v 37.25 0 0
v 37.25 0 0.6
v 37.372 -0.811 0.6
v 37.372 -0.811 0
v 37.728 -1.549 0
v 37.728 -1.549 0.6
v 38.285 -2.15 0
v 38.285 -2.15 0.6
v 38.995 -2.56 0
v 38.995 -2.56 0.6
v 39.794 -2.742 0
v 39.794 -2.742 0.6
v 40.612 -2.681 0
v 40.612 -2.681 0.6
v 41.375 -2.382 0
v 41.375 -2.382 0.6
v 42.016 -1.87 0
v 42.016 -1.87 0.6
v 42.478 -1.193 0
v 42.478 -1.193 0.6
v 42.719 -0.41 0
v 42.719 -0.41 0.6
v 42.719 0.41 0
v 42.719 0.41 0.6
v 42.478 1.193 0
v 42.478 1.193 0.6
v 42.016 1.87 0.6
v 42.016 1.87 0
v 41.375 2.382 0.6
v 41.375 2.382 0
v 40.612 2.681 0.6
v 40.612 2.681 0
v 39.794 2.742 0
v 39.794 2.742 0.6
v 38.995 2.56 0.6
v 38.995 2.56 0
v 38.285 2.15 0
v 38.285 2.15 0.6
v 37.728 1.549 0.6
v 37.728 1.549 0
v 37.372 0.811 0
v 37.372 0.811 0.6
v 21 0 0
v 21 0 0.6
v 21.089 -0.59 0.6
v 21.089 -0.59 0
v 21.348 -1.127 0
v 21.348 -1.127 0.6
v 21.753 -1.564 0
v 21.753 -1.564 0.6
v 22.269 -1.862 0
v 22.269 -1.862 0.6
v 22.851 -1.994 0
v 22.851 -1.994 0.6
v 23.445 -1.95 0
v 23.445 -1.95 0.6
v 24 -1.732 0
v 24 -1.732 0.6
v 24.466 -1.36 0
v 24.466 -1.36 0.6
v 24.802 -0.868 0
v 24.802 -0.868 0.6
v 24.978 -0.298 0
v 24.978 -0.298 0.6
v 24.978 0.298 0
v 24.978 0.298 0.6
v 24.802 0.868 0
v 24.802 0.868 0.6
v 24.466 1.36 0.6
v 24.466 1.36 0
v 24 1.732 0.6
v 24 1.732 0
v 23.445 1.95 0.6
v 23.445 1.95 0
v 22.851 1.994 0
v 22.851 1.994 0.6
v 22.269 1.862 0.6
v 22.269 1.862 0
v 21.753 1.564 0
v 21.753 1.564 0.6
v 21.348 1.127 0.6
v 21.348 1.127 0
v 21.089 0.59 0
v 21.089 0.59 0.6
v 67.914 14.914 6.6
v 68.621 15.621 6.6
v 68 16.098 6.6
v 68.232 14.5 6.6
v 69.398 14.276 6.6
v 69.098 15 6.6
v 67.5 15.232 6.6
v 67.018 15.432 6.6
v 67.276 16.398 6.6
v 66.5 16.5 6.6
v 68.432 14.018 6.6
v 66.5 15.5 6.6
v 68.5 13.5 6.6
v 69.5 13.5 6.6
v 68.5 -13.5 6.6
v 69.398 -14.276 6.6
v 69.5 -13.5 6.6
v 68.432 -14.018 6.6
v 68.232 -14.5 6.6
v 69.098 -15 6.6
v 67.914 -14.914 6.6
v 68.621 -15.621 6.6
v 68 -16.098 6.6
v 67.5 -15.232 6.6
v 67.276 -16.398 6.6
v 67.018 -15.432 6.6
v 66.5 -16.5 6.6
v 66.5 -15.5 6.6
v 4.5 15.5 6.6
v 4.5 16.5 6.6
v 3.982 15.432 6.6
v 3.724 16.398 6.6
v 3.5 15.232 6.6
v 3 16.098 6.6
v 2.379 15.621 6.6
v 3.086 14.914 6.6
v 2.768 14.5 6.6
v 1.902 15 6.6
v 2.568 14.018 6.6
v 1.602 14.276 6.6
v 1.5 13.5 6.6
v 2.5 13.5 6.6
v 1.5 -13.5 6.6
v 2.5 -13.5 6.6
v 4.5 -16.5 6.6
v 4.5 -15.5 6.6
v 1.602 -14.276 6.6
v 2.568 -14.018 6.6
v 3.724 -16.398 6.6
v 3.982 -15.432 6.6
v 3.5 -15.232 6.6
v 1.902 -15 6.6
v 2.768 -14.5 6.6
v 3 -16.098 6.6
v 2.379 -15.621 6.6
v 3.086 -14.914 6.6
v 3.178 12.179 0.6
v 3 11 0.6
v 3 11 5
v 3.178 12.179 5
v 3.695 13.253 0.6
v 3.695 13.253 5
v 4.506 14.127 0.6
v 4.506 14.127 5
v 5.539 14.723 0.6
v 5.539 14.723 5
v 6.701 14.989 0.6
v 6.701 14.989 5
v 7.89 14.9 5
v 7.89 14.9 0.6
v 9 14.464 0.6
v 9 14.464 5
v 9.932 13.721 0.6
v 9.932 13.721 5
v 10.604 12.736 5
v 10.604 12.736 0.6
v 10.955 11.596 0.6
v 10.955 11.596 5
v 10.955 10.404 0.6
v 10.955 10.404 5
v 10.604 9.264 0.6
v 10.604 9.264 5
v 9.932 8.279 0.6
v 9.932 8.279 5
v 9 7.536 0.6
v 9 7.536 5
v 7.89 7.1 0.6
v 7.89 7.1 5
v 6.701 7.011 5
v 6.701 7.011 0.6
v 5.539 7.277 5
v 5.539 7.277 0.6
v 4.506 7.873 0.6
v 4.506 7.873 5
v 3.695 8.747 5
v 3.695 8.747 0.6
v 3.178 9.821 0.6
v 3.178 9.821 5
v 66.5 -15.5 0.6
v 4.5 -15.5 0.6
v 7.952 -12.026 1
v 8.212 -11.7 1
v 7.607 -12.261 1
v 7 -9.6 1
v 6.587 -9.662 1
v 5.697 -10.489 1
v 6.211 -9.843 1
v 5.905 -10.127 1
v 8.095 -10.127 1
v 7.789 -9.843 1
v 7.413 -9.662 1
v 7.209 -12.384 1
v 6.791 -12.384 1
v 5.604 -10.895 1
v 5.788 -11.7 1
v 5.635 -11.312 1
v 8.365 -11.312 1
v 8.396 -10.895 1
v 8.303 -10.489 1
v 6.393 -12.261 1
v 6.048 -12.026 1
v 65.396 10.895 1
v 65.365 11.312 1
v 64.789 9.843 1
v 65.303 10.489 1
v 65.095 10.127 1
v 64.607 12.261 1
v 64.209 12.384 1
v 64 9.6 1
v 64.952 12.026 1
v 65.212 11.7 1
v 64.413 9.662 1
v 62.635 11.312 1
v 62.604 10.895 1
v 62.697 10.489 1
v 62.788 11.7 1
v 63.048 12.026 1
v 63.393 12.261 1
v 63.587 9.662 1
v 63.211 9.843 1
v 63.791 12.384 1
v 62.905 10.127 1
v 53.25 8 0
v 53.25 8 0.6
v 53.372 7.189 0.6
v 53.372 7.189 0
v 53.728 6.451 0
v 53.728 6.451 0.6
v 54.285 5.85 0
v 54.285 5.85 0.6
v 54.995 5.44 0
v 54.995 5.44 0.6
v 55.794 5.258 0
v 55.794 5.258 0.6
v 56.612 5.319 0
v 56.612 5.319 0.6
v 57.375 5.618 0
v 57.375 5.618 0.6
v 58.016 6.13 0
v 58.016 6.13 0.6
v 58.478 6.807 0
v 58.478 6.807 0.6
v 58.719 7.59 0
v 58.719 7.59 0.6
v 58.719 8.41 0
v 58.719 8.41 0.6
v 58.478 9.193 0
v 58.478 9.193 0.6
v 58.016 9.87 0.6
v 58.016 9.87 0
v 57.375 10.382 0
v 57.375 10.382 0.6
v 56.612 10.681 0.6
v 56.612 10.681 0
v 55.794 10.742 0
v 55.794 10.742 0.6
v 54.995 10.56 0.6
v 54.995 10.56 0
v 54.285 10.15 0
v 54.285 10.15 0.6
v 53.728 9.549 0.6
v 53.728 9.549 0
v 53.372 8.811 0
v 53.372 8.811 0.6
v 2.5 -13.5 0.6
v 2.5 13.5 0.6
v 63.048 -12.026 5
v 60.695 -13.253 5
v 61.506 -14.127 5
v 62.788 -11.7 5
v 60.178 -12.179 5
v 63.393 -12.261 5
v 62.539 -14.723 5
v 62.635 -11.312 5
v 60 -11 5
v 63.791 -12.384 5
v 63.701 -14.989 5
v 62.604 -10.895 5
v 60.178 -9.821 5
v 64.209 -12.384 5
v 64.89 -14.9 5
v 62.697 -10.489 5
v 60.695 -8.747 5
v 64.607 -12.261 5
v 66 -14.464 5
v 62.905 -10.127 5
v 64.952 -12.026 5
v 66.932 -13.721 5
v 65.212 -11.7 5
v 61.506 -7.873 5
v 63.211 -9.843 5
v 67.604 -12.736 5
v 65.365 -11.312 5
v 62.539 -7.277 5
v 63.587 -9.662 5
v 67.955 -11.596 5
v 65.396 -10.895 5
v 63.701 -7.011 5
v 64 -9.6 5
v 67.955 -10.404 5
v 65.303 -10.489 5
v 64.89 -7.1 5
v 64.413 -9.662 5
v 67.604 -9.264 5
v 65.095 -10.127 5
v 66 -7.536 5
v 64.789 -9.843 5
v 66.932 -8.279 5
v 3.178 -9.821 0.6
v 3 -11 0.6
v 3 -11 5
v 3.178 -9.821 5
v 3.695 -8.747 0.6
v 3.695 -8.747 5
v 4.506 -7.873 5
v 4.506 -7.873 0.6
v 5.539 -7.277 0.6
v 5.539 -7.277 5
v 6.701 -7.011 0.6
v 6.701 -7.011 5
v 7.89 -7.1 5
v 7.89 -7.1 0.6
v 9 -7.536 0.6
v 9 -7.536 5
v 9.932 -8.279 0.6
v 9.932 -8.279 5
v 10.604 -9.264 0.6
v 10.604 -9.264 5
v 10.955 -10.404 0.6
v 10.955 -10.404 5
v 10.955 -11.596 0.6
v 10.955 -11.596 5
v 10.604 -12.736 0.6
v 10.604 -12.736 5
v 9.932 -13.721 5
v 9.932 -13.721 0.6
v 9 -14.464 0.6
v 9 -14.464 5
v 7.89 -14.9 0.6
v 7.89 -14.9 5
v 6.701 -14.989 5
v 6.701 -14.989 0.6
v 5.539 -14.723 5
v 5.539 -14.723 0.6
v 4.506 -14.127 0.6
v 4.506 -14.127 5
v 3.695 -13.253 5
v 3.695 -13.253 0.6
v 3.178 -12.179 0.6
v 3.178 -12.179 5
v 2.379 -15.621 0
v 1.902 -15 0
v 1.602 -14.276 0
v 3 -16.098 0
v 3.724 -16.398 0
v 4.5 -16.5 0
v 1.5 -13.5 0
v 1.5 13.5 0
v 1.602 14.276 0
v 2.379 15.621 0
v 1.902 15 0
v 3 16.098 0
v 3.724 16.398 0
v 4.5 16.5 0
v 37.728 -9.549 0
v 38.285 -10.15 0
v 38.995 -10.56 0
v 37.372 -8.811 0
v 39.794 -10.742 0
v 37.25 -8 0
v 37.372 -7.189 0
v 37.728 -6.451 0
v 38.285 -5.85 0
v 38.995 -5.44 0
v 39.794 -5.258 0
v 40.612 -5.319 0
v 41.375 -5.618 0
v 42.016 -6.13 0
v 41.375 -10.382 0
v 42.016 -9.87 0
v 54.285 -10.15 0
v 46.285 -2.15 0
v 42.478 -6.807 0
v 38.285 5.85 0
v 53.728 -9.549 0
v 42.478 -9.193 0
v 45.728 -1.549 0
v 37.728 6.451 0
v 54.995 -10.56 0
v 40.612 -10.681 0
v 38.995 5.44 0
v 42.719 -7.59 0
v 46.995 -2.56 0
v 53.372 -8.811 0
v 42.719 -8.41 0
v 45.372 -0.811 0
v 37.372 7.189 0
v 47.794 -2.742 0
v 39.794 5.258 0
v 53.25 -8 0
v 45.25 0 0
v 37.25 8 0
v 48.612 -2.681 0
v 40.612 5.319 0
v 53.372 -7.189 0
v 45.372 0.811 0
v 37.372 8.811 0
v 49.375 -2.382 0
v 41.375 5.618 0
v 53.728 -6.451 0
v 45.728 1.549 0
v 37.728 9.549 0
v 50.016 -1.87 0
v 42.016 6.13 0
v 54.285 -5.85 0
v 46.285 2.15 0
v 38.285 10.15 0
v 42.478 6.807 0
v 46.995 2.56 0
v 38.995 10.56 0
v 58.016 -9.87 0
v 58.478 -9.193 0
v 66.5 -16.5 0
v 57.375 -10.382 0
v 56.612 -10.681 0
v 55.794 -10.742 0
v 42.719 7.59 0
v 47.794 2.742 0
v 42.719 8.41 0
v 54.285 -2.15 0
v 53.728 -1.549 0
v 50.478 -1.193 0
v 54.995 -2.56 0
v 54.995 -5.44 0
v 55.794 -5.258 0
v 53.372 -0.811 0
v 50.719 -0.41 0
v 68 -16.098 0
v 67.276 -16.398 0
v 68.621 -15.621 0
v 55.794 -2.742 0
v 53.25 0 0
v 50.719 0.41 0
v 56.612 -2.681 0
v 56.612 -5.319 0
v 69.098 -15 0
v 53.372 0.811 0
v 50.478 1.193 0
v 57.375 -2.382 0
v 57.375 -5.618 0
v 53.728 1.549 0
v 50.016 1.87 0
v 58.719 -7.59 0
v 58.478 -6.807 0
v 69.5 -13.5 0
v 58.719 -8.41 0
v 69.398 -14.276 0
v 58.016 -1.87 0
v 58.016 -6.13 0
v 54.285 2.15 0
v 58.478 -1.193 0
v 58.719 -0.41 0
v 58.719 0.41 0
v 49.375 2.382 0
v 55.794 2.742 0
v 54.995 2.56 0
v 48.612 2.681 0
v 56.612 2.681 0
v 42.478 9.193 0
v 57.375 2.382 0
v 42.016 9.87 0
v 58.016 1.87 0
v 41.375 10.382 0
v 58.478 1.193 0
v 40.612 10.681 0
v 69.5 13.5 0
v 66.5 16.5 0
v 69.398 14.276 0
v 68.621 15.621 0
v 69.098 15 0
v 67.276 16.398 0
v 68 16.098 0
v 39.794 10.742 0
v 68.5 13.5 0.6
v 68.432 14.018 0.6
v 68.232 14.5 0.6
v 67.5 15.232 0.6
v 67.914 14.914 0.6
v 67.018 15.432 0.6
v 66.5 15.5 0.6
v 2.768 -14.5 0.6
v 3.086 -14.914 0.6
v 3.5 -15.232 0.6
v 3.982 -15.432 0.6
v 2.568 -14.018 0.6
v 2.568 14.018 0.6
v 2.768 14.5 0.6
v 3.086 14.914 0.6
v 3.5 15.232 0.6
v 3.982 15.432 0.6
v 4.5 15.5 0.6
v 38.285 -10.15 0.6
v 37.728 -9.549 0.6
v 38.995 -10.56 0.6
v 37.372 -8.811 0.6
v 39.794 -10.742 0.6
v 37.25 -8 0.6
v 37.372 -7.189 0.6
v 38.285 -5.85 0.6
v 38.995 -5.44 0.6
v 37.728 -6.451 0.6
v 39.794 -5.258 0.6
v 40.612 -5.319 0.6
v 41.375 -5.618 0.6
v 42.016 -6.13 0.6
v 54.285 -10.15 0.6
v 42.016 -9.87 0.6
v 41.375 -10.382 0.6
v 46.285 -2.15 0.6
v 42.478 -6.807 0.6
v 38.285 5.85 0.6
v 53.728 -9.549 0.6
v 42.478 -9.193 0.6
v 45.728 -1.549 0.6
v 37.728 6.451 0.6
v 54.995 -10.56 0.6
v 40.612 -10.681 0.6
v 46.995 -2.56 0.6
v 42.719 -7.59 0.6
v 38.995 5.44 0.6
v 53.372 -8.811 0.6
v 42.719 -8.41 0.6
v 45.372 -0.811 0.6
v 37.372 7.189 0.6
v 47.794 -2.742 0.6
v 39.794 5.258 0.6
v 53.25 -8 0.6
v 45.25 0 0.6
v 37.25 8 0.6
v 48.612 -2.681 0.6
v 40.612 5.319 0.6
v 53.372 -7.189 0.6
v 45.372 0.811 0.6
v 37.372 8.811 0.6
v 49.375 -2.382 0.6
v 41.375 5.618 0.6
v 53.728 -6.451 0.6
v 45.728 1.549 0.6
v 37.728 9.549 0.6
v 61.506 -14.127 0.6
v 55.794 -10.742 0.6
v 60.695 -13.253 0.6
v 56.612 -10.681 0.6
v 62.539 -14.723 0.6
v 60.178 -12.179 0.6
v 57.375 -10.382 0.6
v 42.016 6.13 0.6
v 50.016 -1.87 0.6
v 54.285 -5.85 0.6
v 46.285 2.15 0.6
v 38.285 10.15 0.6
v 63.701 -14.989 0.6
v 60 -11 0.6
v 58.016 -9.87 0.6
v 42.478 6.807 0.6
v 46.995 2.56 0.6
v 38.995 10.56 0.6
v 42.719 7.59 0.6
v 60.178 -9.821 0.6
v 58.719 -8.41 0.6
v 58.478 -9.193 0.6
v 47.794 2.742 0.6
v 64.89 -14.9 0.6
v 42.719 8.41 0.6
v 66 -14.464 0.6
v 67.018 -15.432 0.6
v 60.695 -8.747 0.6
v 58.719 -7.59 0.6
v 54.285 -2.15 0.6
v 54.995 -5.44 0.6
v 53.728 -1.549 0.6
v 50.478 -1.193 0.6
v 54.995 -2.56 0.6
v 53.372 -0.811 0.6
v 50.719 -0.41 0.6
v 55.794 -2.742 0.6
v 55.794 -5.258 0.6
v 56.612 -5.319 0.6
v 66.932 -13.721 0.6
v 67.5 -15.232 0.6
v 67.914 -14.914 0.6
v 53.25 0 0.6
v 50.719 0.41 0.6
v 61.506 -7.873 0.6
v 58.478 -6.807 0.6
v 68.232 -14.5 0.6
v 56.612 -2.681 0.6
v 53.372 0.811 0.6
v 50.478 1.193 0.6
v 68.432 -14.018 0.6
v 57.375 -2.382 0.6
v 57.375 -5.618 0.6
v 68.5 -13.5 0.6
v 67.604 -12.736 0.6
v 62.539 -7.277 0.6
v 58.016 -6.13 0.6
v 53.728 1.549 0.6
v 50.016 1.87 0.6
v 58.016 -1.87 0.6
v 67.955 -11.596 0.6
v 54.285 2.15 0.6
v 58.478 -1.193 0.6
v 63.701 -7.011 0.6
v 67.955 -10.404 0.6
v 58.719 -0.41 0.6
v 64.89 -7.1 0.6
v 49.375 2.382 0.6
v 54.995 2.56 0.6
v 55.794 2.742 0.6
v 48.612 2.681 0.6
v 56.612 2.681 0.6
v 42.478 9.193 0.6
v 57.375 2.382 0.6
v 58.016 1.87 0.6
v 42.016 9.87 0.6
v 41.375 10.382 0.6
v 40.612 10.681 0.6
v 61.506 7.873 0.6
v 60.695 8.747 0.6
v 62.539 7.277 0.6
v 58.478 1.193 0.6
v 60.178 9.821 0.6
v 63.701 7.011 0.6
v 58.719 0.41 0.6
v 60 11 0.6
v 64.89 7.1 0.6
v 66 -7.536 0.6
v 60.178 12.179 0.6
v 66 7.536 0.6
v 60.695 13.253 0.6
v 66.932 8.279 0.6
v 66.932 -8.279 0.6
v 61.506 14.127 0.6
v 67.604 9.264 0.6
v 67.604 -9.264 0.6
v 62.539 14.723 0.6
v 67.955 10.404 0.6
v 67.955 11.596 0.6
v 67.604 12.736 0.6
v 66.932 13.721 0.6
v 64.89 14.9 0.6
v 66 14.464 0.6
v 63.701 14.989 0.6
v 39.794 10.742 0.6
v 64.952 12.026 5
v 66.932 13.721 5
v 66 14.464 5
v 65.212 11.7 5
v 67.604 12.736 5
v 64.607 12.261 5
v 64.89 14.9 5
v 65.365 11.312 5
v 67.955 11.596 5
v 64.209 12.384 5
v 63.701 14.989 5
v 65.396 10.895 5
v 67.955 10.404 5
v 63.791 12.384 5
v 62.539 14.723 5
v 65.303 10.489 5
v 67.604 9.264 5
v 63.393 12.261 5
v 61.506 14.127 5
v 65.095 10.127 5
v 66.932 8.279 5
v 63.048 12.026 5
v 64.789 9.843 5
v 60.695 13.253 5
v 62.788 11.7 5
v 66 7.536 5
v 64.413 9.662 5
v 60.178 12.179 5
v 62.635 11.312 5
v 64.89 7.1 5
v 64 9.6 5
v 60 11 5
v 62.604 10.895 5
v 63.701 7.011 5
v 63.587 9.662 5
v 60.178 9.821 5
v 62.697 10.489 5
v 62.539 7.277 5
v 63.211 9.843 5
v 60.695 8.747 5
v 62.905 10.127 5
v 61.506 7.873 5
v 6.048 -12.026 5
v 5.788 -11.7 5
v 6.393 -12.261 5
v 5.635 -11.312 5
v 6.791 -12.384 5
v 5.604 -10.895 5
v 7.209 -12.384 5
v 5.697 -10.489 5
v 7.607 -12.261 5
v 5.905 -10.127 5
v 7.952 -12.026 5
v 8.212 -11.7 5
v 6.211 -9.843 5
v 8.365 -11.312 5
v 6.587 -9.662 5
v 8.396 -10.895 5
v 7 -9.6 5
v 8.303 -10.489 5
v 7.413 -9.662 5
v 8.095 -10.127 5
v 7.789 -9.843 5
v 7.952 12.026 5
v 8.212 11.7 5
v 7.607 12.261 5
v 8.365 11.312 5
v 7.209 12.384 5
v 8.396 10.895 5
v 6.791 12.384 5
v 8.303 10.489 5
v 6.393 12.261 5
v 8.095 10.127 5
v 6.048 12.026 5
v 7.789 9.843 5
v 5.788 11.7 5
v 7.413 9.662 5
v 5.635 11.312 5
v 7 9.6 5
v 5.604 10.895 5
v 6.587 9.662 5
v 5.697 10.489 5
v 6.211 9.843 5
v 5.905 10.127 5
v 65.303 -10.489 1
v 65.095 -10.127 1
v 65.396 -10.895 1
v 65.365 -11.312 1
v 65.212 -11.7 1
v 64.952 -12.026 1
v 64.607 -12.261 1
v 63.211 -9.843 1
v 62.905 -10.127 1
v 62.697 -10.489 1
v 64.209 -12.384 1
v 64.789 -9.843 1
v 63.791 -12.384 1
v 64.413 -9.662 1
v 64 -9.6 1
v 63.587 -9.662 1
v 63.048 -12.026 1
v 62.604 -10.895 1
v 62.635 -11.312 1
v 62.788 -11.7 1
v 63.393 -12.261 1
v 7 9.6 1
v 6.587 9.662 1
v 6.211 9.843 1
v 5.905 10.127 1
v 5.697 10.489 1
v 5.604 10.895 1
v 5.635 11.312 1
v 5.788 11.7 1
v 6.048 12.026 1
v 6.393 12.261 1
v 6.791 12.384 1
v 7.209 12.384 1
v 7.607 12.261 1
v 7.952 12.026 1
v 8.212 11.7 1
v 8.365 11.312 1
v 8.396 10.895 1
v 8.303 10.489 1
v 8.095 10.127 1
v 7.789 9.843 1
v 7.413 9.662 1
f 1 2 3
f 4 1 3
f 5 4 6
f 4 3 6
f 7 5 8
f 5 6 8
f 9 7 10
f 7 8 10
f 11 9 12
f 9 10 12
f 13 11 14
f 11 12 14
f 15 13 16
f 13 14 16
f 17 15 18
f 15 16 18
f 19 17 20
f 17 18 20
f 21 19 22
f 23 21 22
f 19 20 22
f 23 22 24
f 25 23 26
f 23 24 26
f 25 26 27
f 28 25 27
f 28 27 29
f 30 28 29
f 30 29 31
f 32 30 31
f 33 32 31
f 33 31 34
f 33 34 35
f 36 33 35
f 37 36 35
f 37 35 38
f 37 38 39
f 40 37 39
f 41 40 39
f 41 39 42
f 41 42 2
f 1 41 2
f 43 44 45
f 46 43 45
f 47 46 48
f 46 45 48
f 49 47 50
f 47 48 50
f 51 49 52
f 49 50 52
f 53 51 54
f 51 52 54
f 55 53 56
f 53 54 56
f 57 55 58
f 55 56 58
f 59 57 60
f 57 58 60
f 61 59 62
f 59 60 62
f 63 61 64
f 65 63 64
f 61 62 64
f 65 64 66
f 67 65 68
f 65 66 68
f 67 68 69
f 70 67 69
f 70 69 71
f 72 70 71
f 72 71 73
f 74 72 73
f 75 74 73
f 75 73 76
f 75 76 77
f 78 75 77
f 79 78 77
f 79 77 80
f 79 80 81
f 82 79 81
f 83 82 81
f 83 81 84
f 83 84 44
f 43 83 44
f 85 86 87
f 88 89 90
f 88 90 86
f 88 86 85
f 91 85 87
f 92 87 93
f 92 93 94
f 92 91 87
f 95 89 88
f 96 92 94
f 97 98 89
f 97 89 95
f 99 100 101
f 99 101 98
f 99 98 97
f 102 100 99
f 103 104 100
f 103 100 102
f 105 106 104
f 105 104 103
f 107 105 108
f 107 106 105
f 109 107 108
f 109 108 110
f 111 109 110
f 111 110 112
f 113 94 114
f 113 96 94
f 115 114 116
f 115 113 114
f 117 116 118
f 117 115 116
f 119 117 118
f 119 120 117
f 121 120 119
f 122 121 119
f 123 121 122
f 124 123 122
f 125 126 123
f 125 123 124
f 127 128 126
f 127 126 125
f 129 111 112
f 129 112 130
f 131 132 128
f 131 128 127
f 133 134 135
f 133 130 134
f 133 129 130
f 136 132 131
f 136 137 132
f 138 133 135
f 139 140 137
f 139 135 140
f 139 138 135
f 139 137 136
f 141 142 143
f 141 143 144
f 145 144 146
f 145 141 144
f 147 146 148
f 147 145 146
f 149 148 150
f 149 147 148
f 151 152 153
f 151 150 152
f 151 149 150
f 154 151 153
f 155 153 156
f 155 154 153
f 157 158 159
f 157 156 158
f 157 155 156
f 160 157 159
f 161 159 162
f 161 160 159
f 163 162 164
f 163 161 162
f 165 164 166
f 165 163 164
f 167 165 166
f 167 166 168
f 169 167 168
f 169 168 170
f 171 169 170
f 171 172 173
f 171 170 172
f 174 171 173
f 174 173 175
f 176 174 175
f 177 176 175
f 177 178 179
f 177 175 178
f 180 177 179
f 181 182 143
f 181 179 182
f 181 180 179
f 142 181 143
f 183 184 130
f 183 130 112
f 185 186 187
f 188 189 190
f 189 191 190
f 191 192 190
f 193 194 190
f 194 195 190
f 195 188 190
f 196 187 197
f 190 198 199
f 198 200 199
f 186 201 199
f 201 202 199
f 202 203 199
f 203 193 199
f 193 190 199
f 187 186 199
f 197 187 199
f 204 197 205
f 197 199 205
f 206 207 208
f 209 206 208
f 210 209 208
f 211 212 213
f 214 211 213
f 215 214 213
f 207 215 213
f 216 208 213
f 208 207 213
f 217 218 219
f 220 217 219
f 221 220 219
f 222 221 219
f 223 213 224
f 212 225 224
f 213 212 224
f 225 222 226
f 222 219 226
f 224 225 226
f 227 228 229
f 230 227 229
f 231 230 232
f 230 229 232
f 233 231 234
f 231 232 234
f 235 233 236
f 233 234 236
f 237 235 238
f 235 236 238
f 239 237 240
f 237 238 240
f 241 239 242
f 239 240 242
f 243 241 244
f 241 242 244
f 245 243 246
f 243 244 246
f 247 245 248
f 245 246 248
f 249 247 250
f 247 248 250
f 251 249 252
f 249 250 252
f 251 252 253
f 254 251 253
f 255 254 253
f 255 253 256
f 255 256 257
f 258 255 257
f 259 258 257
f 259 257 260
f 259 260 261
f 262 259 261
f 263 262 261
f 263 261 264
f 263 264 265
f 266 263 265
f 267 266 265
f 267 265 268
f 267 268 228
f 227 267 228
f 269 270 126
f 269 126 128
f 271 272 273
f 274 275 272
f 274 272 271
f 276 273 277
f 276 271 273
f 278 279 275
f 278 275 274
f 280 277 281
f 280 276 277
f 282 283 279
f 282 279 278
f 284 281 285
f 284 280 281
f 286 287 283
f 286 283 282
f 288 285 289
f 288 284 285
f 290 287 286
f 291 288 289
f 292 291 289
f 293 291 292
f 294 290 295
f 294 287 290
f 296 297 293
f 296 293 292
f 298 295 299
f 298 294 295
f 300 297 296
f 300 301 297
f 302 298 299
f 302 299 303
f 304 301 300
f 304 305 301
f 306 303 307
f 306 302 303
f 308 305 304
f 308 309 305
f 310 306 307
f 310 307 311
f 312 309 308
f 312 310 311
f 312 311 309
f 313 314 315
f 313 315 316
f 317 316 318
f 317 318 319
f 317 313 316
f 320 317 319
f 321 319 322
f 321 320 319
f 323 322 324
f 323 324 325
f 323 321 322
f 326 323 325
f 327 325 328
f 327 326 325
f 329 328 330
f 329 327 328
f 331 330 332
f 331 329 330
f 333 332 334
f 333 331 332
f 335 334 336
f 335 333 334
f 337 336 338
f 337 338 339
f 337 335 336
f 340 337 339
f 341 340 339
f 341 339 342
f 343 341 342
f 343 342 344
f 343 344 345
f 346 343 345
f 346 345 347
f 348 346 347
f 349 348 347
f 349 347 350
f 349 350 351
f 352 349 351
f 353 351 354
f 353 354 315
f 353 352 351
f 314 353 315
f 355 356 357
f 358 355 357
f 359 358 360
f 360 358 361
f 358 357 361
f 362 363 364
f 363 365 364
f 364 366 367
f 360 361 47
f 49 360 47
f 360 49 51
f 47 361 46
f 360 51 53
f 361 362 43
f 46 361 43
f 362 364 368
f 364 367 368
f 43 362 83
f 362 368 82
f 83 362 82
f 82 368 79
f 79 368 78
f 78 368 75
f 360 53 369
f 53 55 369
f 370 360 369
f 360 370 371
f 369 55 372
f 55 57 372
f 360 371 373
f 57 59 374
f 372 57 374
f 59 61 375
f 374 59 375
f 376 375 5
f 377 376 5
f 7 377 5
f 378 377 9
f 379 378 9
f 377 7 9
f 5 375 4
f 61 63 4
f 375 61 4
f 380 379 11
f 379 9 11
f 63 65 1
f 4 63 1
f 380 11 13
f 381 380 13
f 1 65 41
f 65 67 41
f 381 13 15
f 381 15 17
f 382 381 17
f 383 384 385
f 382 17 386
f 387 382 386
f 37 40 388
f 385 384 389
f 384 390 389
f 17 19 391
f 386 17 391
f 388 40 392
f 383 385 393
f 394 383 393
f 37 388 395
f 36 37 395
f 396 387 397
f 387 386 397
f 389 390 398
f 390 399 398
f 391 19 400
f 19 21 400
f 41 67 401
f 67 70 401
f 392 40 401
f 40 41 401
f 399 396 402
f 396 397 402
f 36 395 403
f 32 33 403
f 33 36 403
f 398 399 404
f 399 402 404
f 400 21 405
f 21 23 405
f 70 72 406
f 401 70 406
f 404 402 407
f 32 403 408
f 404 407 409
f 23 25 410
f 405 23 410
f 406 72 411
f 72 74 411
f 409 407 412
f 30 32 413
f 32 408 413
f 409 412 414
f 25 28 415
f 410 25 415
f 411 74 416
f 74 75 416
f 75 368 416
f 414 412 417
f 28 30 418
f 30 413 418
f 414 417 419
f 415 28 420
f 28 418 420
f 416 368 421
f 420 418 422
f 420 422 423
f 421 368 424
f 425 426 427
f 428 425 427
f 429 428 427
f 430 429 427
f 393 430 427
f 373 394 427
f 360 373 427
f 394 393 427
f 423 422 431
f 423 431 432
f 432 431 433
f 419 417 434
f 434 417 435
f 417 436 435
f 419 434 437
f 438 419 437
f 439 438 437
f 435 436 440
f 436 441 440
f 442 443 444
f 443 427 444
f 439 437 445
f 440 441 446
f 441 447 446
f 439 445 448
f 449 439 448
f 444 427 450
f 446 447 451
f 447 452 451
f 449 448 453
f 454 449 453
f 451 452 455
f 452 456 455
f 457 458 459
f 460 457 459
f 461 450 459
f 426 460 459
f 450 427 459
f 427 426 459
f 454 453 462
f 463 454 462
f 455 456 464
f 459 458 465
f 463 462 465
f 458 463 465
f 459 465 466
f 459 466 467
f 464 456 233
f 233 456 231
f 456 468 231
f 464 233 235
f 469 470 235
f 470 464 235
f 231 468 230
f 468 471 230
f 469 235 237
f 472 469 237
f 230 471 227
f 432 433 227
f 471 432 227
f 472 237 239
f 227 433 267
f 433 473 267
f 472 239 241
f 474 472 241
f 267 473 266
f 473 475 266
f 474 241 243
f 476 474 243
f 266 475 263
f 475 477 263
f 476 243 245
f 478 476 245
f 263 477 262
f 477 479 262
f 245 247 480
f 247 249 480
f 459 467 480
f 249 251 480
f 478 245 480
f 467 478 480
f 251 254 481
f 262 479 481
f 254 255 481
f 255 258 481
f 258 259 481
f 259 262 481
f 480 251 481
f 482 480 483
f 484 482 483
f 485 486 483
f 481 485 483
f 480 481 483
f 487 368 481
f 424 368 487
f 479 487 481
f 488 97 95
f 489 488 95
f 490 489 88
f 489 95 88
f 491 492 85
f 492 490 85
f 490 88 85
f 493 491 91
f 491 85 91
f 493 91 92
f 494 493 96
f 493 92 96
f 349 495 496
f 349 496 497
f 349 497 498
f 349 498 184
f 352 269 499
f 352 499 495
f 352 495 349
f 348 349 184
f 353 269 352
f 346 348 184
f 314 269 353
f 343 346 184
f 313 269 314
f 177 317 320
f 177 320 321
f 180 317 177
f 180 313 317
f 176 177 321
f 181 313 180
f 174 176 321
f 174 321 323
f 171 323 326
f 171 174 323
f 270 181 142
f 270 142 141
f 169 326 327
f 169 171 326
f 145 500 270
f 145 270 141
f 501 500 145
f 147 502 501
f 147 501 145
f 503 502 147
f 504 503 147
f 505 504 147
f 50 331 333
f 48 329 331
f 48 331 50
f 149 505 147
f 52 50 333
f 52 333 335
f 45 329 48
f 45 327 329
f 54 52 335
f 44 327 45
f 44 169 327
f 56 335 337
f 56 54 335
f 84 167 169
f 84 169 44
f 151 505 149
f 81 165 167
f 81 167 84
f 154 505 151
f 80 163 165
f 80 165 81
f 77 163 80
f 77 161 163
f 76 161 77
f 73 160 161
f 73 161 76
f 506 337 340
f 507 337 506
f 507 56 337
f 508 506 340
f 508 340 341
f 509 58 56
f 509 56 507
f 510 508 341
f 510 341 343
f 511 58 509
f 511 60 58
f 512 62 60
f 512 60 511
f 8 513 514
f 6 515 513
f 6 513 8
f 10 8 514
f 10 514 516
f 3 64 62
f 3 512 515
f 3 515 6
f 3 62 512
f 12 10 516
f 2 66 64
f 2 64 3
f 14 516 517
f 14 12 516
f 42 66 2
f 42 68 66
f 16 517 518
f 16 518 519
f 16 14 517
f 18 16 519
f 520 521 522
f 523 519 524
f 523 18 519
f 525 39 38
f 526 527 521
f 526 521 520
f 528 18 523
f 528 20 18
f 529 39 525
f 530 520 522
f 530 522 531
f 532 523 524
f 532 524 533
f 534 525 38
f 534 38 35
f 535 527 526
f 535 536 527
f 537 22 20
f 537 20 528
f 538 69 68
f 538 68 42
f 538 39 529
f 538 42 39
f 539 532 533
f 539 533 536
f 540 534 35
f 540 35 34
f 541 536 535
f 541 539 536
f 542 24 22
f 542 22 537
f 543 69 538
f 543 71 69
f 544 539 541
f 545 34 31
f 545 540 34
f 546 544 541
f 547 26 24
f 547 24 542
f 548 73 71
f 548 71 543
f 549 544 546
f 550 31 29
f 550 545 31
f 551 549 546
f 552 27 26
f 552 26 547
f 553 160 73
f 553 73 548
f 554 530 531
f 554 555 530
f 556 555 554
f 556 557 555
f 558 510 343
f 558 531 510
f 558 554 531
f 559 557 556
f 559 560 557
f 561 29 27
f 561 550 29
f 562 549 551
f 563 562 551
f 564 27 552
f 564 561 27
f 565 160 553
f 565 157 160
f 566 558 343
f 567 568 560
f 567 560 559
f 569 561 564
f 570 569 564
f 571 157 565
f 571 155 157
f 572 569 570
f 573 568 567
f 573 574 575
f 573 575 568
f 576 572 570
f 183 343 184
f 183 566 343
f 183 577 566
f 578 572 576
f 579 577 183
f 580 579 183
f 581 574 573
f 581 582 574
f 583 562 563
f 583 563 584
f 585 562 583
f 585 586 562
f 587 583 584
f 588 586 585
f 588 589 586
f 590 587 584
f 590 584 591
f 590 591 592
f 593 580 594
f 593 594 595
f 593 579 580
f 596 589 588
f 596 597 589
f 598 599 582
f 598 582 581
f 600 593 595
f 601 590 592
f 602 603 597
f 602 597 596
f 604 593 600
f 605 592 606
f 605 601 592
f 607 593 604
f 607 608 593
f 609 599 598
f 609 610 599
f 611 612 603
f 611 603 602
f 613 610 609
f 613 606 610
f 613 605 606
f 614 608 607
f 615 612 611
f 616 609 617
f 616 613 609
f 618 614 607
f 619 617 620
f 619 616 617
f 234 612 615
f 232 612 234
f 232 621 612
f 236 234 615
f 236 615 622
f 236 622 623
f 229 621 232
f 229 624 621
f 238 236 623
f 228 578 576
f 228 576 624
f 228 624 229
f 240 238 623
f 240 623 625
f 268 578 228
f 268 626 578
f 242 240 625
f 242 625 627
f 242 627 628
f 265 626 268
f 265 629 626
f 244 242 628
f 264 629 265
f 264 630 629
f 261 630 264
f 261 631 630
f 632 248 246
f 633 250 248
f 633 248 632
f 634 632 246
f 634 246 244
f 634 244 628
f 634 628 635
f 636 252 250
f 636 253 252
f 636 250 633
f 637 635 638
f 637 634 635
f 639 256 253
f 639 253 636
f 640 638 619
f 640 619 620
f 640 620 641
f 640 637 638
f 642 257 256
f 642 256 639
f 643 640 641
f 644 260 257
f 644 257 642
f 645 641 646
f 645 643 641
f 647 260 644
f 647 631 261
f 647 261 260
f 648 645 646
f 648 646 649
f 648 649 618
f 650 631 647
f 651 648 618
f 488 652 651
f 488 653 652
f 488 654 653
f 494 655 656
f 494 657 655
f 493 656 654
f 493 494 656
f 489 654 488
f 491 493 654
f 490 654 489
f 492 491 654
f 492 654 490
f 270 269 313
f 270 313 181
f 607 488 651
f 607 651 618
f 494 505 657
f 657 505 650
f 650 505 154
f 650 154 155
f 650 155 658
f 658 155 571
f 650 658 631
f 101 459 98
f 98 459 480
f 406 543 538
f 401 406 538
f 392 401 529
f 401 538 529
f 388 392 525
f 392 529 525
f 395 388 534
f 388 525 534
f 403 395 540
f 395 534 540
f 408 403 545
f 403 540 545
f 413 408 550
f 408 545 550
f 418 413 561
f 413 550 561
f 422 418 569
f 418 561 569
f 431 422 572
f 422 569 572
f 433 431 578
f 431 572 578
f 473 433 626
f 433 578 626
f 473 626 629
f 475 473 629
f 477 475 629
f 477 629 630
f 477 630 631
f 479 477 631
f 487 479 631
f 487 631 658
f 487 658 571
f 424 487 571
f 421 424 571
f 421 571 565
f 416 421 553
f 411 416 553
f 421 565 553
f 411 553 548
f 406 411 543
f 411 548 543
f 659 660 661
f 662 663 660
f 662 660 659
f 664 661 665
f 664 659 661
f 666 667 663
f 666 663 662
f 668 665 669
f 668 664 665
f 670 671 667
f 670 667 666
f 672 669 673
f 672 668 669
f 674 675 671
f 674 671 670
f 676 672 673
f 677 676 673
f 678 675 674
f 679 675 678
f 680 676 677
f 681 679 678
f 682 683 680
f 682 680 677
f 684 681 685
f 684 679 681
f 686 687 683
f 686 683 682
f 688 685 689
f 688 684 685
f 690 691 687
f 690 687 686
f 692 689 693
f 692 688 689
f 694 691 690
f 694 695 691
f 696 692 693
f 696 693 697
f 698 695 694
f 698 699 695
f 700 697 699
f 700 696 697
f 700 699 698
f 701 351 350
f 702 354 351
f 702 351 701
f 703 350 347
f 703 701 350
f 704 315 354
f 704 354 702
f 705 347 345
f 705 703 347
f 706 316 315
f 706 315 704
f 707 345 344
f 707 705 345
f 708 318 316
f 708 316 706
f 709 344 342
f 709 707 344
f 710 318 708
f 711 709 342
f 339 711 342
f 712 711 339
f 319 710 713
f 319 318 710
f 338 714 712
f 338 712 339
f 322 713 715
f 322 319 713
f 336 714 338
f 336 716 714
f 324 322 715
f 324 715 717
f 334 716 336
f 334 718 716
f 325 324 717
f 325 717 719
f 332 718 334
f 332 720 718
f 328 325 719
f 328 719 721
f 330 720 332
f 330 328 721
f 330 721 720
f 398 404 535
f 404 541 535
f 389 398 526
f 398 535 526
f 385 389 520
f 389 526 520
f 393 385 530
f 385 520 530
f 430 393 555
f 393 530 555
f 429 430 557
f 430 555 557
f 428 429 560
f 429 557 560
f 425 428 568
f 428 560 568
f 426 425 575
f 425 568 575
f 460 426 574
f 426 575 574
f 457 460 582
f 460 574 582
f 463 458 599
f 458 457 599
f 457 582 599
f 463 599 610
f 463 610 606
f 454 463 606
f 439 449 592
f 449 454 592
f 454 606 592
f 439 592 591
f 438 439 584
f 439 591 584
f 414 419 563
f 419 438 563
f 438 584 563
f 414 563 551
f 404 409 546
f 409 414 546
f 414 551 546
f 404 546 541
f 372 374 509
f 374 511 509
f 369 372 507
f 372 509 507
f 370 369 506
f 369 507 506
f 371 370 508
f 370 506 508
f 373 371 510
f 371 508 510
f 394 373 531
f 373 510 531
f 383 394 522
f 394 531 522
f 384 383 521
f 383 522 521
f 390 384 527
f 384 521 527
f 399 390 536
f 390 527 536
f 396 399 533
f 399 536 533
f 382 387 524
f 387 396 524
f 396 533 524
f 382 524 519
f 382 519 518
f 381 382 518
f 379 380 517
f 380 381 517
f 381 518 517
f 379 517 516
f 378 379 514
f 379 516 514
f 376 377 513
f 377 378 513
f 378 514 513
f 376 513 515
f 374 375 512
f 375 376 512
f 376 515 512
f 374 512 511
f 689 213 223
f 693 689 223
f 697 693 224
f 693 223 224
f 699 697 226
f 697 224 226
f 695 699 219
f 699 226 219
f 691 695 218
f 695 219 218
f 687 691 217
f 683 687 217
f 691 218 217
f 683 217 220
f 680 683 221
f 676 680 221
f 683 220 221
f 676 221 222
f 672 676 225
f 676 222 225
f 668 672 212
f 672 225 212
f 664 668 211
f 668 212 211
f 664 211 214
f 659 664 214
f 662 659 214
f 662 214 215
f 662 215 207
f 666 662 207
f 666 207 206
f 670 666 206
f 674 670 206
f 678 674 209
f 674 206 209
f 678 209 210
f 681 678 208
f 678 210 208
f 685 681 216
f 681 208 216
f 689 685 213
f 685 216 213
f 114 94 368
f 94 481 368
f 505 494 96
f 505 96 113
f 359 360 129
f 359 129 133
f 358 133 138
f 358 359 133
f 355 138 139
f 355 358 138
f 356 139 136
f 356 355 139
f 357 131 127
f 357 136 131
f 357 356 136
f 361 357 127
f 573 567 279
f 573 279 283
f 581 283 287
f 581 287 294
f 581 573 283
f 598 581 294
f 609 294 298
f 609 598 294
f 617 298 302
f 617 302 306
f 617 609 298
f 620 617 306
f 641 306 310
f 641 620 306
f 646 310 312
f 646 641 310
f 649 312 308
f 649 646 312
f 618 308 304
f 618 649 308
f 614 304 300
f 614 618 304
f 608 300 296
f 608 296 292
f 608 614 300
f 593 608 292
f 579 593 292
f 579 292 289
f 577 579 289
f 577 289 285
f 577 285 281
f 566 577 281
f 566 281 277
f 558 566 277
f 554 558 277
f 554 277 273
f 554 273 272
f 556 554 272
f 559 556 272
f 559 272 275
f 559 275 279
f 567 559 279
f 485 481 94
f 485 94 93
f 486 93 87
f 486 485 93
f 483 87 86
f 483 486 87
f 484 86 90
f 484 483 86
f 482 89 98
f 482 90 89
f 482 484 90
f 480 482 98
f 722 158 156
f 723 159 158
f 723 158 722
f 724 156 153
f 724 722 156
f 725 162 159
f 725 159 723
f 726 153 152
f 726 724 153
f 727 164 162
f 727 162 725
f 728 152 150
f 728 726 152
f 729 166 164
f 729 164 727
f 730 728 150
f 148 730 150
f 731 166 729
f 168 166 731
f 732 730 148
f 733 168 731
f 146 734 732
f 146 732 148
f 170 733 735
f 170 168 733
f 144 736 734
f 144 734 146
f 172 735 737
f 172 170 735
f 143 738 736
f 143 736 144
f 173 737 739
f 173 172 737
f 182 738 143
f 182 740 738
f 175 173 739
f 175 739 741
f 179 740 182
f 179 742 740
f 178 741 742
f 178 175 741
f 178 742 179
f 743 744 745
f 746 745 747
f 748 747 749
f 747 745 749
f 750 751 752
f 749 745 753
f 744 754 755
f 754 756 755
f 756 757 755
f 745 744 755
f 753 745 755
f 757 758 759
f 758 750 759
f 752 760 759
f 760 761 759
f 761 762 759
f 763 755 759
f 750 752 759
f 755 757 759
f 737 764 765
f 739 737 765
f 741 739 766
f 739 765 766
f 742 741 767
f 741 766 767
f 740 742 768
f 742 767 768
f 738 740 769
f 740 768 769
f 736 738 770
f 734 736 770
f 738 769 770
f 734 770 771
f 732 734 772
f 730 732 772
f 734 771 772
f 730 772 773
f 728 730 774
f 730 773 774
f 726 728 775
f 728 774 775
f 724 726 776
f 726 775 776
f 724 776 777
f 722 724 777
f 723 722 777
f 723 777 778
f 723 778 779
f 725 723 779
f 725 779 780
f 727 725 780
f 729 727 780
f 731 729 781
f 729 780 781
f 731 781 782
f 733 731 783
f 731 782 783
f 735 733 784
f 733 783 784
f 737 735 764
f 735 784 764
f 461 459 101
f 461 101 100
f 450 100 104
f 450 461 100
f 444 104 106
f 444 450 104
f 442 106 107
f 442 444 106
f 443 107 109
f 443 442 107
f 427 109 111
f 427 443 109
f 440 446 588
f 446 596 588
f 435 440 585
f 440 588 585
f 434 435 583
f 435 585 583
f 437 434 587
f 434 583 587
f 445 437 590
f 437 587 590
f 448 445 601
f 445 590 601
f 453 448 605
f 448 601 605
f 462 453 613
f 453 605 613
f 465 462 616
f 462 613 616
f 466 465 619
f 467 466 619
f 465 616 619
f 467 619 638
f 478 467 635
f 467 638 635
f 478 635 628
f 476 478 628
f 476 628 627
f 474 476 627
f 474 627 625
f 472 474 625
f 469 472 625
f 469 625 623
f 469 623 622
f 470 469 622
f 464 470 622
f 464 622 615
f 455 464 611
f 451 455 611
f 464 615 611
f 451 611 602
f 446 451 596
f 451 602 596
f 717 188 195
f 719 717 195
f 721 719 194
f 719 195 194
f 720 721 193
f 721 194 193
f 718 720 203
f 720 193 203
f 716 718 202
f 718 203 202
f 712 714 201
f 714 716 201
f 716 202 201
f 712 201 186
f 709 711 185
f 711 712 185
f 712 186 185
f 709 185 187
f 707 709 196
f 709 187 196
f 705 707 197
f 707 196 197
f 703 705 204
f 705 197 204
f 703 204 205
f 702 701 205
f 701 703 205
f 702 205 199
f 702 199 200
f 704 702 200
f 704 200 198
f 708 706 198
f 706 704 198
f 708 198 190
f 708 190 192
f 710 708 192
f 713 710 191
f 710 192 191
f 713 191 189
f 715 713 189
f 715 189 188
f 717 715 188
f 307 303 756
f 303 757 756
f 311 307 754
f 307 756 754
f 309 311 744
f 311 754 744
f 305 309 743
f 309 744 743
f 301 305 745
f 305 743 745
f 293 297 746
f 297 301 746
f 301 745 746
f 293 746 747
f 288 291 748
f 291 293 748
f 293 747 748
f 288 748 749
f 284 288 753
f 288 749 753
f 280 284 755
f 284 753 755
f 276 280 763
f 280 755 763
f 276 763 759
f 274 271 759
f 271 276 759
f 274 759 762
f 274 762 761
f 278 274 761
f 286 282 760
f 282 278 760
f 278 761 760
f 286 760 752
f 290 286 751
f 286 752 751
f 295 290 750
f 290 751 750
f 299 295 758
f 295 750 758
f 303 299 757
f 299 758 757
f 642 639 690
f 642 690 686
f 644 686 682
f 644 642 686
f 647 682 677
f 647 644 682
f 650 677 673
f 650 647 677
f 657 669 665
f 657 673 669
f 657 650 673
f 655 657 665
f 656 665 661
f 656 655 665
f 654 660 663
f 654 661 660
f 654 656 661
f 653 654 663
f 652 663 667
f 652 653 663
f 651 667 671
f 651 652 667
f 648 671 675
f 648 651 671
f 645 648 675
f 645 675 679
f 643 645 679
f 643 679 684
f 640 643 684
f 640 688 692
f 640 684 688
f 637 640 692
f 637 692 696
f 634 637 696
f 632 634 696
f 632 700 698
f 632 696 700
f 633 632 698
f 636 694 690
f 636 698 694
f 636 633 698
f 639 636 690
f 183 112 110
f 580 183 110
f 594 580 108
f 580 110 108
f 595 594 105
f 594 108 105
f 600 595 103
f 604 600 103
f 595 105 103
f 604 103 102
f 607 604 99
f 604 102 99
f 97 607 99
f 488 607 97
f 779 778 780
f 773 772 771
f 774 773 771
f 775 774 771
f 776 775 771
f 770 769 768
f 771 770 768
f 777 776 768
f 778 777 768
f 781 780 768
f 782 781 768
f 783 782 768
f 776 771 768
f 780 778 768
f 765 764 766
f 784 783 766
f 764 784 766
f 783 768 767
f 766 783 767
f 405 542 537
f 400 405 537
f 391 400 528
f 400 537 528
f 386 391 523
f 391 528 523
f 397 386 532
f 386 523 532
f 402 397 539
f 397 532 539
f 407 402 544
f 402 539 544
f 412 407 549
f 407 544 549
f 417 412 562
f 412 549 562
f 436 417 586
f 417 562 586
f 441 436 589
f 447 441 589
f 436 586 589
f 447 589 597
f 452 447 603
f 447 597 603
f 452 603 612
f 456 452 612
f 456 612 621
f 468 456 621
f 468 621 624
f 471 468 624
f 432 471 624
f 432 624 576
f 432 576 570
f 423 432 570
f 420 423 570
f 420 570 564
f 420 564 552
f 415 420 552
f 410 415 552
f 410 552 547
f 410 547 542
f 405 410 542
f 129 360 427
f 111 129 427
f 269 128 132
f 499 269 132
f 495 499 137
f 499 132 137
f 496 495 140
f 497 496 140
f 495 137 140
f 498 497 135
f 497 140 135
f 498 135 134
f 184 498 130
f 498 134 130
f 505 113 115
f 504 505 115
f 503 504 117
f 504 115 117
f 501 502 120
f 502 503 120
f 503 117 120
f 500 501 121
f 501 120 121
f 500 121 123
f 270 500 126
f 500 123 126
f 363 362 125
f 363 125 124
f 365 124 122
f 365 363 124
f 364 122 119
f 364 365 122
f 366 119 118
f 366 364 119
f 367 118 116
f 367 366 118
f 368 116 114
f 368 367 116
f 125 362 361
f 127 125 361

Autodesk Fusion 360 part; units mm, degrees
sketch "Skizze1" plane through (0, 0, 0) normal (0, 0, 1) x (1, 0, 0)
  line L0 (1.5, 0) -> (69.5, 0)
  line L1 (69.5, 0) -> (69.5, 16.5)
  line L2 (69.5, 16.5) -> (1.5, 16.5)
  line L3 (1.5, 16.5) -> (1.5, 0)
  dimension "d1" = 68
  dimension "d2" = 16.5
extrude "Extrusion1" add sketch "Skizze1" along normal blind 0.6
sketch "Skizze2" plane through (0, 0, 0.6) normal (0, 0, 1) x (-1, 0, 0)
  line L0 (-1.5, -16.5) -> (-1.5, 0)
  line L1 (-1.5, 0) -> (-69.5, 0)
  line L2 (-69.5, 0) -> (-69.5, -16.5)
  line L3 (-69.5, -16.5) -> (-1.5, -16.5)
  line L4 (-1.5, 0) -> (-1.5, -16.5)
  line L5 (-1.5, -16.5) -> (-69.5, -16.5)
  line L6 (-69.5, -16.5) -> (-69.5, 0)
  line L7 (-69.5, 0) -> (-68.5, 0)
  line L8 (-68.5, 0) -> (-68.5, -15.5)
  line L9 (-68.5, -15.5) -> (-2.5, -15.5)
  line L10 (-2.5, -15.5) -> (-2.5, 0)
  line L11 (-2.5, 0) -> (-1.5, 0)
  dimension "d5" = 1
  dimension "d6" = 1
  dimension "d7" = 1
extrude "Extrusion2" add sketch "Skizze2" along normal blind 6 contours L0 L1 L2 L3 L4 L5 L6 L7 L8 L9 L10 L11
fillet "Abrundung1" radius 2 2 edges at (2.5, 15.5, 3.6) (68.5, 15.5, 3.6)
fillet "Abrundung2" radius 3 2 edges at (69.5, 16.5, 3.3) (1.5, 16.5, 3.3)
sketch "Skizze3" plane through (0, 0, 0.6) normal (0, 0, 1) x (-1, 0, 0)
  arc A0 (-68.5, -13.5) -> (-66.5, -15.5) centre (-66.5, -13.5) ccw
  line L0 (-66.5, -15.5) -> (-4.5, -15.5)
  arc A1 (-4.5, -15.5) -> (-2.5, -13.5) centre (-4.5, -13.5) ccw
  line L1 (-2.5, -13.5) -> (-2.5, 0)
  line L2 (-2.5, 0) -> (-68.5, 0)
  line L3 (-68.5, 0) -> (-68.5, -13.5)
  circle A2 centre (-64, -11) radius 4
  circle A3 centre (-7, -11) radius 4
  dimension "d14" = 8
  dimension "d15" = 8
  dimension "d16" = 57
  dimension "d17" = 11
  dimension "d18" = 7
  dimension "d19" = 11
extrude "Extrusion3" add sketch "Skizze3" along normal blind 4.4 contours A2 | A3
sketch "Skizze4" plane through (0, 0, 5) normal (0, 0, 1) x (-1, 0, 0)
  circle A0 centre (-7, -11) radius 4
  circle A1 centre (-64, -11) radius 4
  point P0 (-7, -11)
  point P1 (-64, -11)
hole "Bohrung1" at (7, 11, 5) at (64, 11, 5) direction (0, 0, -1) diameter 2.8 depth 4 tip angle 180
sketch "Skizze5" plane through (0, 0, 0.6) normal (0, 0, 1) x (-1, 0, 0)
  circle A0 centre (-64, -11) radius 4
  circle A1 centre (-7, -11) radius 4
  arc A2 (-68.5, -13.5) -> (-66.5, -15.5) centre (-66.5, -13.5) ccw
  line L0 (-66.5, -15.5) -> (-4.5, -15.5)
  arc A3 (-4.5, -15.5) -> (-2.5, -13.5) centre (-4.5, -13.5) ccw
  line L1 (-2.5, -13.5) -> (-2.5, 0)
  line L2 (-2.5, 0) -> (-68.5, 0)
  line L3 (-68.5, 0) -> (-68.5, -13.5)
  circle A4 centre (-48, 0) radius 2.75
  circle A5 centre (-56, 0) radius 2.75
  circle A6 centre (-56, -8) radius 2.75
  circle A7 centre (-40, -8) radius 2.75
  circle A8 centre (-40, 0) radius 2.75
  circle A9 centre (-23, 0) radius 2
  dimension "d25" = 4
  dimension "d26" = 5.5
  dimension "d27" = 5.5
  dimension "d28" = 5.5
  dimension "d29" = 5.5
  dimension "d30" = 5.5
  dimension "d31" = 8
  dimension "d32" = 8
  dimension "d33" = 8
  dimension "d34" = 8
  dimension "d36" = 48
  dimension "d37" = 8
  dimension "d38" = 8
  dimension "d43" = 17
extrude "Extrusion4" cut sketch "Skizze5" against normal blind 5 contours L2 A5 | L2 A4 | L2 A9 | L2 A8 | A6 | A7 picked at (-55.1334, -0.6679) picked at (-47.1334, -0.6679) picked at (-23.6445, -0.2959) picked at (-39.1334, -0.6679)
mirror "Spiegeln1" about plane through (0, 0, 0) normal (0, 1, 0) of bodies 1 merged
equation "d20 = 6 mm - 1.6 mm"
